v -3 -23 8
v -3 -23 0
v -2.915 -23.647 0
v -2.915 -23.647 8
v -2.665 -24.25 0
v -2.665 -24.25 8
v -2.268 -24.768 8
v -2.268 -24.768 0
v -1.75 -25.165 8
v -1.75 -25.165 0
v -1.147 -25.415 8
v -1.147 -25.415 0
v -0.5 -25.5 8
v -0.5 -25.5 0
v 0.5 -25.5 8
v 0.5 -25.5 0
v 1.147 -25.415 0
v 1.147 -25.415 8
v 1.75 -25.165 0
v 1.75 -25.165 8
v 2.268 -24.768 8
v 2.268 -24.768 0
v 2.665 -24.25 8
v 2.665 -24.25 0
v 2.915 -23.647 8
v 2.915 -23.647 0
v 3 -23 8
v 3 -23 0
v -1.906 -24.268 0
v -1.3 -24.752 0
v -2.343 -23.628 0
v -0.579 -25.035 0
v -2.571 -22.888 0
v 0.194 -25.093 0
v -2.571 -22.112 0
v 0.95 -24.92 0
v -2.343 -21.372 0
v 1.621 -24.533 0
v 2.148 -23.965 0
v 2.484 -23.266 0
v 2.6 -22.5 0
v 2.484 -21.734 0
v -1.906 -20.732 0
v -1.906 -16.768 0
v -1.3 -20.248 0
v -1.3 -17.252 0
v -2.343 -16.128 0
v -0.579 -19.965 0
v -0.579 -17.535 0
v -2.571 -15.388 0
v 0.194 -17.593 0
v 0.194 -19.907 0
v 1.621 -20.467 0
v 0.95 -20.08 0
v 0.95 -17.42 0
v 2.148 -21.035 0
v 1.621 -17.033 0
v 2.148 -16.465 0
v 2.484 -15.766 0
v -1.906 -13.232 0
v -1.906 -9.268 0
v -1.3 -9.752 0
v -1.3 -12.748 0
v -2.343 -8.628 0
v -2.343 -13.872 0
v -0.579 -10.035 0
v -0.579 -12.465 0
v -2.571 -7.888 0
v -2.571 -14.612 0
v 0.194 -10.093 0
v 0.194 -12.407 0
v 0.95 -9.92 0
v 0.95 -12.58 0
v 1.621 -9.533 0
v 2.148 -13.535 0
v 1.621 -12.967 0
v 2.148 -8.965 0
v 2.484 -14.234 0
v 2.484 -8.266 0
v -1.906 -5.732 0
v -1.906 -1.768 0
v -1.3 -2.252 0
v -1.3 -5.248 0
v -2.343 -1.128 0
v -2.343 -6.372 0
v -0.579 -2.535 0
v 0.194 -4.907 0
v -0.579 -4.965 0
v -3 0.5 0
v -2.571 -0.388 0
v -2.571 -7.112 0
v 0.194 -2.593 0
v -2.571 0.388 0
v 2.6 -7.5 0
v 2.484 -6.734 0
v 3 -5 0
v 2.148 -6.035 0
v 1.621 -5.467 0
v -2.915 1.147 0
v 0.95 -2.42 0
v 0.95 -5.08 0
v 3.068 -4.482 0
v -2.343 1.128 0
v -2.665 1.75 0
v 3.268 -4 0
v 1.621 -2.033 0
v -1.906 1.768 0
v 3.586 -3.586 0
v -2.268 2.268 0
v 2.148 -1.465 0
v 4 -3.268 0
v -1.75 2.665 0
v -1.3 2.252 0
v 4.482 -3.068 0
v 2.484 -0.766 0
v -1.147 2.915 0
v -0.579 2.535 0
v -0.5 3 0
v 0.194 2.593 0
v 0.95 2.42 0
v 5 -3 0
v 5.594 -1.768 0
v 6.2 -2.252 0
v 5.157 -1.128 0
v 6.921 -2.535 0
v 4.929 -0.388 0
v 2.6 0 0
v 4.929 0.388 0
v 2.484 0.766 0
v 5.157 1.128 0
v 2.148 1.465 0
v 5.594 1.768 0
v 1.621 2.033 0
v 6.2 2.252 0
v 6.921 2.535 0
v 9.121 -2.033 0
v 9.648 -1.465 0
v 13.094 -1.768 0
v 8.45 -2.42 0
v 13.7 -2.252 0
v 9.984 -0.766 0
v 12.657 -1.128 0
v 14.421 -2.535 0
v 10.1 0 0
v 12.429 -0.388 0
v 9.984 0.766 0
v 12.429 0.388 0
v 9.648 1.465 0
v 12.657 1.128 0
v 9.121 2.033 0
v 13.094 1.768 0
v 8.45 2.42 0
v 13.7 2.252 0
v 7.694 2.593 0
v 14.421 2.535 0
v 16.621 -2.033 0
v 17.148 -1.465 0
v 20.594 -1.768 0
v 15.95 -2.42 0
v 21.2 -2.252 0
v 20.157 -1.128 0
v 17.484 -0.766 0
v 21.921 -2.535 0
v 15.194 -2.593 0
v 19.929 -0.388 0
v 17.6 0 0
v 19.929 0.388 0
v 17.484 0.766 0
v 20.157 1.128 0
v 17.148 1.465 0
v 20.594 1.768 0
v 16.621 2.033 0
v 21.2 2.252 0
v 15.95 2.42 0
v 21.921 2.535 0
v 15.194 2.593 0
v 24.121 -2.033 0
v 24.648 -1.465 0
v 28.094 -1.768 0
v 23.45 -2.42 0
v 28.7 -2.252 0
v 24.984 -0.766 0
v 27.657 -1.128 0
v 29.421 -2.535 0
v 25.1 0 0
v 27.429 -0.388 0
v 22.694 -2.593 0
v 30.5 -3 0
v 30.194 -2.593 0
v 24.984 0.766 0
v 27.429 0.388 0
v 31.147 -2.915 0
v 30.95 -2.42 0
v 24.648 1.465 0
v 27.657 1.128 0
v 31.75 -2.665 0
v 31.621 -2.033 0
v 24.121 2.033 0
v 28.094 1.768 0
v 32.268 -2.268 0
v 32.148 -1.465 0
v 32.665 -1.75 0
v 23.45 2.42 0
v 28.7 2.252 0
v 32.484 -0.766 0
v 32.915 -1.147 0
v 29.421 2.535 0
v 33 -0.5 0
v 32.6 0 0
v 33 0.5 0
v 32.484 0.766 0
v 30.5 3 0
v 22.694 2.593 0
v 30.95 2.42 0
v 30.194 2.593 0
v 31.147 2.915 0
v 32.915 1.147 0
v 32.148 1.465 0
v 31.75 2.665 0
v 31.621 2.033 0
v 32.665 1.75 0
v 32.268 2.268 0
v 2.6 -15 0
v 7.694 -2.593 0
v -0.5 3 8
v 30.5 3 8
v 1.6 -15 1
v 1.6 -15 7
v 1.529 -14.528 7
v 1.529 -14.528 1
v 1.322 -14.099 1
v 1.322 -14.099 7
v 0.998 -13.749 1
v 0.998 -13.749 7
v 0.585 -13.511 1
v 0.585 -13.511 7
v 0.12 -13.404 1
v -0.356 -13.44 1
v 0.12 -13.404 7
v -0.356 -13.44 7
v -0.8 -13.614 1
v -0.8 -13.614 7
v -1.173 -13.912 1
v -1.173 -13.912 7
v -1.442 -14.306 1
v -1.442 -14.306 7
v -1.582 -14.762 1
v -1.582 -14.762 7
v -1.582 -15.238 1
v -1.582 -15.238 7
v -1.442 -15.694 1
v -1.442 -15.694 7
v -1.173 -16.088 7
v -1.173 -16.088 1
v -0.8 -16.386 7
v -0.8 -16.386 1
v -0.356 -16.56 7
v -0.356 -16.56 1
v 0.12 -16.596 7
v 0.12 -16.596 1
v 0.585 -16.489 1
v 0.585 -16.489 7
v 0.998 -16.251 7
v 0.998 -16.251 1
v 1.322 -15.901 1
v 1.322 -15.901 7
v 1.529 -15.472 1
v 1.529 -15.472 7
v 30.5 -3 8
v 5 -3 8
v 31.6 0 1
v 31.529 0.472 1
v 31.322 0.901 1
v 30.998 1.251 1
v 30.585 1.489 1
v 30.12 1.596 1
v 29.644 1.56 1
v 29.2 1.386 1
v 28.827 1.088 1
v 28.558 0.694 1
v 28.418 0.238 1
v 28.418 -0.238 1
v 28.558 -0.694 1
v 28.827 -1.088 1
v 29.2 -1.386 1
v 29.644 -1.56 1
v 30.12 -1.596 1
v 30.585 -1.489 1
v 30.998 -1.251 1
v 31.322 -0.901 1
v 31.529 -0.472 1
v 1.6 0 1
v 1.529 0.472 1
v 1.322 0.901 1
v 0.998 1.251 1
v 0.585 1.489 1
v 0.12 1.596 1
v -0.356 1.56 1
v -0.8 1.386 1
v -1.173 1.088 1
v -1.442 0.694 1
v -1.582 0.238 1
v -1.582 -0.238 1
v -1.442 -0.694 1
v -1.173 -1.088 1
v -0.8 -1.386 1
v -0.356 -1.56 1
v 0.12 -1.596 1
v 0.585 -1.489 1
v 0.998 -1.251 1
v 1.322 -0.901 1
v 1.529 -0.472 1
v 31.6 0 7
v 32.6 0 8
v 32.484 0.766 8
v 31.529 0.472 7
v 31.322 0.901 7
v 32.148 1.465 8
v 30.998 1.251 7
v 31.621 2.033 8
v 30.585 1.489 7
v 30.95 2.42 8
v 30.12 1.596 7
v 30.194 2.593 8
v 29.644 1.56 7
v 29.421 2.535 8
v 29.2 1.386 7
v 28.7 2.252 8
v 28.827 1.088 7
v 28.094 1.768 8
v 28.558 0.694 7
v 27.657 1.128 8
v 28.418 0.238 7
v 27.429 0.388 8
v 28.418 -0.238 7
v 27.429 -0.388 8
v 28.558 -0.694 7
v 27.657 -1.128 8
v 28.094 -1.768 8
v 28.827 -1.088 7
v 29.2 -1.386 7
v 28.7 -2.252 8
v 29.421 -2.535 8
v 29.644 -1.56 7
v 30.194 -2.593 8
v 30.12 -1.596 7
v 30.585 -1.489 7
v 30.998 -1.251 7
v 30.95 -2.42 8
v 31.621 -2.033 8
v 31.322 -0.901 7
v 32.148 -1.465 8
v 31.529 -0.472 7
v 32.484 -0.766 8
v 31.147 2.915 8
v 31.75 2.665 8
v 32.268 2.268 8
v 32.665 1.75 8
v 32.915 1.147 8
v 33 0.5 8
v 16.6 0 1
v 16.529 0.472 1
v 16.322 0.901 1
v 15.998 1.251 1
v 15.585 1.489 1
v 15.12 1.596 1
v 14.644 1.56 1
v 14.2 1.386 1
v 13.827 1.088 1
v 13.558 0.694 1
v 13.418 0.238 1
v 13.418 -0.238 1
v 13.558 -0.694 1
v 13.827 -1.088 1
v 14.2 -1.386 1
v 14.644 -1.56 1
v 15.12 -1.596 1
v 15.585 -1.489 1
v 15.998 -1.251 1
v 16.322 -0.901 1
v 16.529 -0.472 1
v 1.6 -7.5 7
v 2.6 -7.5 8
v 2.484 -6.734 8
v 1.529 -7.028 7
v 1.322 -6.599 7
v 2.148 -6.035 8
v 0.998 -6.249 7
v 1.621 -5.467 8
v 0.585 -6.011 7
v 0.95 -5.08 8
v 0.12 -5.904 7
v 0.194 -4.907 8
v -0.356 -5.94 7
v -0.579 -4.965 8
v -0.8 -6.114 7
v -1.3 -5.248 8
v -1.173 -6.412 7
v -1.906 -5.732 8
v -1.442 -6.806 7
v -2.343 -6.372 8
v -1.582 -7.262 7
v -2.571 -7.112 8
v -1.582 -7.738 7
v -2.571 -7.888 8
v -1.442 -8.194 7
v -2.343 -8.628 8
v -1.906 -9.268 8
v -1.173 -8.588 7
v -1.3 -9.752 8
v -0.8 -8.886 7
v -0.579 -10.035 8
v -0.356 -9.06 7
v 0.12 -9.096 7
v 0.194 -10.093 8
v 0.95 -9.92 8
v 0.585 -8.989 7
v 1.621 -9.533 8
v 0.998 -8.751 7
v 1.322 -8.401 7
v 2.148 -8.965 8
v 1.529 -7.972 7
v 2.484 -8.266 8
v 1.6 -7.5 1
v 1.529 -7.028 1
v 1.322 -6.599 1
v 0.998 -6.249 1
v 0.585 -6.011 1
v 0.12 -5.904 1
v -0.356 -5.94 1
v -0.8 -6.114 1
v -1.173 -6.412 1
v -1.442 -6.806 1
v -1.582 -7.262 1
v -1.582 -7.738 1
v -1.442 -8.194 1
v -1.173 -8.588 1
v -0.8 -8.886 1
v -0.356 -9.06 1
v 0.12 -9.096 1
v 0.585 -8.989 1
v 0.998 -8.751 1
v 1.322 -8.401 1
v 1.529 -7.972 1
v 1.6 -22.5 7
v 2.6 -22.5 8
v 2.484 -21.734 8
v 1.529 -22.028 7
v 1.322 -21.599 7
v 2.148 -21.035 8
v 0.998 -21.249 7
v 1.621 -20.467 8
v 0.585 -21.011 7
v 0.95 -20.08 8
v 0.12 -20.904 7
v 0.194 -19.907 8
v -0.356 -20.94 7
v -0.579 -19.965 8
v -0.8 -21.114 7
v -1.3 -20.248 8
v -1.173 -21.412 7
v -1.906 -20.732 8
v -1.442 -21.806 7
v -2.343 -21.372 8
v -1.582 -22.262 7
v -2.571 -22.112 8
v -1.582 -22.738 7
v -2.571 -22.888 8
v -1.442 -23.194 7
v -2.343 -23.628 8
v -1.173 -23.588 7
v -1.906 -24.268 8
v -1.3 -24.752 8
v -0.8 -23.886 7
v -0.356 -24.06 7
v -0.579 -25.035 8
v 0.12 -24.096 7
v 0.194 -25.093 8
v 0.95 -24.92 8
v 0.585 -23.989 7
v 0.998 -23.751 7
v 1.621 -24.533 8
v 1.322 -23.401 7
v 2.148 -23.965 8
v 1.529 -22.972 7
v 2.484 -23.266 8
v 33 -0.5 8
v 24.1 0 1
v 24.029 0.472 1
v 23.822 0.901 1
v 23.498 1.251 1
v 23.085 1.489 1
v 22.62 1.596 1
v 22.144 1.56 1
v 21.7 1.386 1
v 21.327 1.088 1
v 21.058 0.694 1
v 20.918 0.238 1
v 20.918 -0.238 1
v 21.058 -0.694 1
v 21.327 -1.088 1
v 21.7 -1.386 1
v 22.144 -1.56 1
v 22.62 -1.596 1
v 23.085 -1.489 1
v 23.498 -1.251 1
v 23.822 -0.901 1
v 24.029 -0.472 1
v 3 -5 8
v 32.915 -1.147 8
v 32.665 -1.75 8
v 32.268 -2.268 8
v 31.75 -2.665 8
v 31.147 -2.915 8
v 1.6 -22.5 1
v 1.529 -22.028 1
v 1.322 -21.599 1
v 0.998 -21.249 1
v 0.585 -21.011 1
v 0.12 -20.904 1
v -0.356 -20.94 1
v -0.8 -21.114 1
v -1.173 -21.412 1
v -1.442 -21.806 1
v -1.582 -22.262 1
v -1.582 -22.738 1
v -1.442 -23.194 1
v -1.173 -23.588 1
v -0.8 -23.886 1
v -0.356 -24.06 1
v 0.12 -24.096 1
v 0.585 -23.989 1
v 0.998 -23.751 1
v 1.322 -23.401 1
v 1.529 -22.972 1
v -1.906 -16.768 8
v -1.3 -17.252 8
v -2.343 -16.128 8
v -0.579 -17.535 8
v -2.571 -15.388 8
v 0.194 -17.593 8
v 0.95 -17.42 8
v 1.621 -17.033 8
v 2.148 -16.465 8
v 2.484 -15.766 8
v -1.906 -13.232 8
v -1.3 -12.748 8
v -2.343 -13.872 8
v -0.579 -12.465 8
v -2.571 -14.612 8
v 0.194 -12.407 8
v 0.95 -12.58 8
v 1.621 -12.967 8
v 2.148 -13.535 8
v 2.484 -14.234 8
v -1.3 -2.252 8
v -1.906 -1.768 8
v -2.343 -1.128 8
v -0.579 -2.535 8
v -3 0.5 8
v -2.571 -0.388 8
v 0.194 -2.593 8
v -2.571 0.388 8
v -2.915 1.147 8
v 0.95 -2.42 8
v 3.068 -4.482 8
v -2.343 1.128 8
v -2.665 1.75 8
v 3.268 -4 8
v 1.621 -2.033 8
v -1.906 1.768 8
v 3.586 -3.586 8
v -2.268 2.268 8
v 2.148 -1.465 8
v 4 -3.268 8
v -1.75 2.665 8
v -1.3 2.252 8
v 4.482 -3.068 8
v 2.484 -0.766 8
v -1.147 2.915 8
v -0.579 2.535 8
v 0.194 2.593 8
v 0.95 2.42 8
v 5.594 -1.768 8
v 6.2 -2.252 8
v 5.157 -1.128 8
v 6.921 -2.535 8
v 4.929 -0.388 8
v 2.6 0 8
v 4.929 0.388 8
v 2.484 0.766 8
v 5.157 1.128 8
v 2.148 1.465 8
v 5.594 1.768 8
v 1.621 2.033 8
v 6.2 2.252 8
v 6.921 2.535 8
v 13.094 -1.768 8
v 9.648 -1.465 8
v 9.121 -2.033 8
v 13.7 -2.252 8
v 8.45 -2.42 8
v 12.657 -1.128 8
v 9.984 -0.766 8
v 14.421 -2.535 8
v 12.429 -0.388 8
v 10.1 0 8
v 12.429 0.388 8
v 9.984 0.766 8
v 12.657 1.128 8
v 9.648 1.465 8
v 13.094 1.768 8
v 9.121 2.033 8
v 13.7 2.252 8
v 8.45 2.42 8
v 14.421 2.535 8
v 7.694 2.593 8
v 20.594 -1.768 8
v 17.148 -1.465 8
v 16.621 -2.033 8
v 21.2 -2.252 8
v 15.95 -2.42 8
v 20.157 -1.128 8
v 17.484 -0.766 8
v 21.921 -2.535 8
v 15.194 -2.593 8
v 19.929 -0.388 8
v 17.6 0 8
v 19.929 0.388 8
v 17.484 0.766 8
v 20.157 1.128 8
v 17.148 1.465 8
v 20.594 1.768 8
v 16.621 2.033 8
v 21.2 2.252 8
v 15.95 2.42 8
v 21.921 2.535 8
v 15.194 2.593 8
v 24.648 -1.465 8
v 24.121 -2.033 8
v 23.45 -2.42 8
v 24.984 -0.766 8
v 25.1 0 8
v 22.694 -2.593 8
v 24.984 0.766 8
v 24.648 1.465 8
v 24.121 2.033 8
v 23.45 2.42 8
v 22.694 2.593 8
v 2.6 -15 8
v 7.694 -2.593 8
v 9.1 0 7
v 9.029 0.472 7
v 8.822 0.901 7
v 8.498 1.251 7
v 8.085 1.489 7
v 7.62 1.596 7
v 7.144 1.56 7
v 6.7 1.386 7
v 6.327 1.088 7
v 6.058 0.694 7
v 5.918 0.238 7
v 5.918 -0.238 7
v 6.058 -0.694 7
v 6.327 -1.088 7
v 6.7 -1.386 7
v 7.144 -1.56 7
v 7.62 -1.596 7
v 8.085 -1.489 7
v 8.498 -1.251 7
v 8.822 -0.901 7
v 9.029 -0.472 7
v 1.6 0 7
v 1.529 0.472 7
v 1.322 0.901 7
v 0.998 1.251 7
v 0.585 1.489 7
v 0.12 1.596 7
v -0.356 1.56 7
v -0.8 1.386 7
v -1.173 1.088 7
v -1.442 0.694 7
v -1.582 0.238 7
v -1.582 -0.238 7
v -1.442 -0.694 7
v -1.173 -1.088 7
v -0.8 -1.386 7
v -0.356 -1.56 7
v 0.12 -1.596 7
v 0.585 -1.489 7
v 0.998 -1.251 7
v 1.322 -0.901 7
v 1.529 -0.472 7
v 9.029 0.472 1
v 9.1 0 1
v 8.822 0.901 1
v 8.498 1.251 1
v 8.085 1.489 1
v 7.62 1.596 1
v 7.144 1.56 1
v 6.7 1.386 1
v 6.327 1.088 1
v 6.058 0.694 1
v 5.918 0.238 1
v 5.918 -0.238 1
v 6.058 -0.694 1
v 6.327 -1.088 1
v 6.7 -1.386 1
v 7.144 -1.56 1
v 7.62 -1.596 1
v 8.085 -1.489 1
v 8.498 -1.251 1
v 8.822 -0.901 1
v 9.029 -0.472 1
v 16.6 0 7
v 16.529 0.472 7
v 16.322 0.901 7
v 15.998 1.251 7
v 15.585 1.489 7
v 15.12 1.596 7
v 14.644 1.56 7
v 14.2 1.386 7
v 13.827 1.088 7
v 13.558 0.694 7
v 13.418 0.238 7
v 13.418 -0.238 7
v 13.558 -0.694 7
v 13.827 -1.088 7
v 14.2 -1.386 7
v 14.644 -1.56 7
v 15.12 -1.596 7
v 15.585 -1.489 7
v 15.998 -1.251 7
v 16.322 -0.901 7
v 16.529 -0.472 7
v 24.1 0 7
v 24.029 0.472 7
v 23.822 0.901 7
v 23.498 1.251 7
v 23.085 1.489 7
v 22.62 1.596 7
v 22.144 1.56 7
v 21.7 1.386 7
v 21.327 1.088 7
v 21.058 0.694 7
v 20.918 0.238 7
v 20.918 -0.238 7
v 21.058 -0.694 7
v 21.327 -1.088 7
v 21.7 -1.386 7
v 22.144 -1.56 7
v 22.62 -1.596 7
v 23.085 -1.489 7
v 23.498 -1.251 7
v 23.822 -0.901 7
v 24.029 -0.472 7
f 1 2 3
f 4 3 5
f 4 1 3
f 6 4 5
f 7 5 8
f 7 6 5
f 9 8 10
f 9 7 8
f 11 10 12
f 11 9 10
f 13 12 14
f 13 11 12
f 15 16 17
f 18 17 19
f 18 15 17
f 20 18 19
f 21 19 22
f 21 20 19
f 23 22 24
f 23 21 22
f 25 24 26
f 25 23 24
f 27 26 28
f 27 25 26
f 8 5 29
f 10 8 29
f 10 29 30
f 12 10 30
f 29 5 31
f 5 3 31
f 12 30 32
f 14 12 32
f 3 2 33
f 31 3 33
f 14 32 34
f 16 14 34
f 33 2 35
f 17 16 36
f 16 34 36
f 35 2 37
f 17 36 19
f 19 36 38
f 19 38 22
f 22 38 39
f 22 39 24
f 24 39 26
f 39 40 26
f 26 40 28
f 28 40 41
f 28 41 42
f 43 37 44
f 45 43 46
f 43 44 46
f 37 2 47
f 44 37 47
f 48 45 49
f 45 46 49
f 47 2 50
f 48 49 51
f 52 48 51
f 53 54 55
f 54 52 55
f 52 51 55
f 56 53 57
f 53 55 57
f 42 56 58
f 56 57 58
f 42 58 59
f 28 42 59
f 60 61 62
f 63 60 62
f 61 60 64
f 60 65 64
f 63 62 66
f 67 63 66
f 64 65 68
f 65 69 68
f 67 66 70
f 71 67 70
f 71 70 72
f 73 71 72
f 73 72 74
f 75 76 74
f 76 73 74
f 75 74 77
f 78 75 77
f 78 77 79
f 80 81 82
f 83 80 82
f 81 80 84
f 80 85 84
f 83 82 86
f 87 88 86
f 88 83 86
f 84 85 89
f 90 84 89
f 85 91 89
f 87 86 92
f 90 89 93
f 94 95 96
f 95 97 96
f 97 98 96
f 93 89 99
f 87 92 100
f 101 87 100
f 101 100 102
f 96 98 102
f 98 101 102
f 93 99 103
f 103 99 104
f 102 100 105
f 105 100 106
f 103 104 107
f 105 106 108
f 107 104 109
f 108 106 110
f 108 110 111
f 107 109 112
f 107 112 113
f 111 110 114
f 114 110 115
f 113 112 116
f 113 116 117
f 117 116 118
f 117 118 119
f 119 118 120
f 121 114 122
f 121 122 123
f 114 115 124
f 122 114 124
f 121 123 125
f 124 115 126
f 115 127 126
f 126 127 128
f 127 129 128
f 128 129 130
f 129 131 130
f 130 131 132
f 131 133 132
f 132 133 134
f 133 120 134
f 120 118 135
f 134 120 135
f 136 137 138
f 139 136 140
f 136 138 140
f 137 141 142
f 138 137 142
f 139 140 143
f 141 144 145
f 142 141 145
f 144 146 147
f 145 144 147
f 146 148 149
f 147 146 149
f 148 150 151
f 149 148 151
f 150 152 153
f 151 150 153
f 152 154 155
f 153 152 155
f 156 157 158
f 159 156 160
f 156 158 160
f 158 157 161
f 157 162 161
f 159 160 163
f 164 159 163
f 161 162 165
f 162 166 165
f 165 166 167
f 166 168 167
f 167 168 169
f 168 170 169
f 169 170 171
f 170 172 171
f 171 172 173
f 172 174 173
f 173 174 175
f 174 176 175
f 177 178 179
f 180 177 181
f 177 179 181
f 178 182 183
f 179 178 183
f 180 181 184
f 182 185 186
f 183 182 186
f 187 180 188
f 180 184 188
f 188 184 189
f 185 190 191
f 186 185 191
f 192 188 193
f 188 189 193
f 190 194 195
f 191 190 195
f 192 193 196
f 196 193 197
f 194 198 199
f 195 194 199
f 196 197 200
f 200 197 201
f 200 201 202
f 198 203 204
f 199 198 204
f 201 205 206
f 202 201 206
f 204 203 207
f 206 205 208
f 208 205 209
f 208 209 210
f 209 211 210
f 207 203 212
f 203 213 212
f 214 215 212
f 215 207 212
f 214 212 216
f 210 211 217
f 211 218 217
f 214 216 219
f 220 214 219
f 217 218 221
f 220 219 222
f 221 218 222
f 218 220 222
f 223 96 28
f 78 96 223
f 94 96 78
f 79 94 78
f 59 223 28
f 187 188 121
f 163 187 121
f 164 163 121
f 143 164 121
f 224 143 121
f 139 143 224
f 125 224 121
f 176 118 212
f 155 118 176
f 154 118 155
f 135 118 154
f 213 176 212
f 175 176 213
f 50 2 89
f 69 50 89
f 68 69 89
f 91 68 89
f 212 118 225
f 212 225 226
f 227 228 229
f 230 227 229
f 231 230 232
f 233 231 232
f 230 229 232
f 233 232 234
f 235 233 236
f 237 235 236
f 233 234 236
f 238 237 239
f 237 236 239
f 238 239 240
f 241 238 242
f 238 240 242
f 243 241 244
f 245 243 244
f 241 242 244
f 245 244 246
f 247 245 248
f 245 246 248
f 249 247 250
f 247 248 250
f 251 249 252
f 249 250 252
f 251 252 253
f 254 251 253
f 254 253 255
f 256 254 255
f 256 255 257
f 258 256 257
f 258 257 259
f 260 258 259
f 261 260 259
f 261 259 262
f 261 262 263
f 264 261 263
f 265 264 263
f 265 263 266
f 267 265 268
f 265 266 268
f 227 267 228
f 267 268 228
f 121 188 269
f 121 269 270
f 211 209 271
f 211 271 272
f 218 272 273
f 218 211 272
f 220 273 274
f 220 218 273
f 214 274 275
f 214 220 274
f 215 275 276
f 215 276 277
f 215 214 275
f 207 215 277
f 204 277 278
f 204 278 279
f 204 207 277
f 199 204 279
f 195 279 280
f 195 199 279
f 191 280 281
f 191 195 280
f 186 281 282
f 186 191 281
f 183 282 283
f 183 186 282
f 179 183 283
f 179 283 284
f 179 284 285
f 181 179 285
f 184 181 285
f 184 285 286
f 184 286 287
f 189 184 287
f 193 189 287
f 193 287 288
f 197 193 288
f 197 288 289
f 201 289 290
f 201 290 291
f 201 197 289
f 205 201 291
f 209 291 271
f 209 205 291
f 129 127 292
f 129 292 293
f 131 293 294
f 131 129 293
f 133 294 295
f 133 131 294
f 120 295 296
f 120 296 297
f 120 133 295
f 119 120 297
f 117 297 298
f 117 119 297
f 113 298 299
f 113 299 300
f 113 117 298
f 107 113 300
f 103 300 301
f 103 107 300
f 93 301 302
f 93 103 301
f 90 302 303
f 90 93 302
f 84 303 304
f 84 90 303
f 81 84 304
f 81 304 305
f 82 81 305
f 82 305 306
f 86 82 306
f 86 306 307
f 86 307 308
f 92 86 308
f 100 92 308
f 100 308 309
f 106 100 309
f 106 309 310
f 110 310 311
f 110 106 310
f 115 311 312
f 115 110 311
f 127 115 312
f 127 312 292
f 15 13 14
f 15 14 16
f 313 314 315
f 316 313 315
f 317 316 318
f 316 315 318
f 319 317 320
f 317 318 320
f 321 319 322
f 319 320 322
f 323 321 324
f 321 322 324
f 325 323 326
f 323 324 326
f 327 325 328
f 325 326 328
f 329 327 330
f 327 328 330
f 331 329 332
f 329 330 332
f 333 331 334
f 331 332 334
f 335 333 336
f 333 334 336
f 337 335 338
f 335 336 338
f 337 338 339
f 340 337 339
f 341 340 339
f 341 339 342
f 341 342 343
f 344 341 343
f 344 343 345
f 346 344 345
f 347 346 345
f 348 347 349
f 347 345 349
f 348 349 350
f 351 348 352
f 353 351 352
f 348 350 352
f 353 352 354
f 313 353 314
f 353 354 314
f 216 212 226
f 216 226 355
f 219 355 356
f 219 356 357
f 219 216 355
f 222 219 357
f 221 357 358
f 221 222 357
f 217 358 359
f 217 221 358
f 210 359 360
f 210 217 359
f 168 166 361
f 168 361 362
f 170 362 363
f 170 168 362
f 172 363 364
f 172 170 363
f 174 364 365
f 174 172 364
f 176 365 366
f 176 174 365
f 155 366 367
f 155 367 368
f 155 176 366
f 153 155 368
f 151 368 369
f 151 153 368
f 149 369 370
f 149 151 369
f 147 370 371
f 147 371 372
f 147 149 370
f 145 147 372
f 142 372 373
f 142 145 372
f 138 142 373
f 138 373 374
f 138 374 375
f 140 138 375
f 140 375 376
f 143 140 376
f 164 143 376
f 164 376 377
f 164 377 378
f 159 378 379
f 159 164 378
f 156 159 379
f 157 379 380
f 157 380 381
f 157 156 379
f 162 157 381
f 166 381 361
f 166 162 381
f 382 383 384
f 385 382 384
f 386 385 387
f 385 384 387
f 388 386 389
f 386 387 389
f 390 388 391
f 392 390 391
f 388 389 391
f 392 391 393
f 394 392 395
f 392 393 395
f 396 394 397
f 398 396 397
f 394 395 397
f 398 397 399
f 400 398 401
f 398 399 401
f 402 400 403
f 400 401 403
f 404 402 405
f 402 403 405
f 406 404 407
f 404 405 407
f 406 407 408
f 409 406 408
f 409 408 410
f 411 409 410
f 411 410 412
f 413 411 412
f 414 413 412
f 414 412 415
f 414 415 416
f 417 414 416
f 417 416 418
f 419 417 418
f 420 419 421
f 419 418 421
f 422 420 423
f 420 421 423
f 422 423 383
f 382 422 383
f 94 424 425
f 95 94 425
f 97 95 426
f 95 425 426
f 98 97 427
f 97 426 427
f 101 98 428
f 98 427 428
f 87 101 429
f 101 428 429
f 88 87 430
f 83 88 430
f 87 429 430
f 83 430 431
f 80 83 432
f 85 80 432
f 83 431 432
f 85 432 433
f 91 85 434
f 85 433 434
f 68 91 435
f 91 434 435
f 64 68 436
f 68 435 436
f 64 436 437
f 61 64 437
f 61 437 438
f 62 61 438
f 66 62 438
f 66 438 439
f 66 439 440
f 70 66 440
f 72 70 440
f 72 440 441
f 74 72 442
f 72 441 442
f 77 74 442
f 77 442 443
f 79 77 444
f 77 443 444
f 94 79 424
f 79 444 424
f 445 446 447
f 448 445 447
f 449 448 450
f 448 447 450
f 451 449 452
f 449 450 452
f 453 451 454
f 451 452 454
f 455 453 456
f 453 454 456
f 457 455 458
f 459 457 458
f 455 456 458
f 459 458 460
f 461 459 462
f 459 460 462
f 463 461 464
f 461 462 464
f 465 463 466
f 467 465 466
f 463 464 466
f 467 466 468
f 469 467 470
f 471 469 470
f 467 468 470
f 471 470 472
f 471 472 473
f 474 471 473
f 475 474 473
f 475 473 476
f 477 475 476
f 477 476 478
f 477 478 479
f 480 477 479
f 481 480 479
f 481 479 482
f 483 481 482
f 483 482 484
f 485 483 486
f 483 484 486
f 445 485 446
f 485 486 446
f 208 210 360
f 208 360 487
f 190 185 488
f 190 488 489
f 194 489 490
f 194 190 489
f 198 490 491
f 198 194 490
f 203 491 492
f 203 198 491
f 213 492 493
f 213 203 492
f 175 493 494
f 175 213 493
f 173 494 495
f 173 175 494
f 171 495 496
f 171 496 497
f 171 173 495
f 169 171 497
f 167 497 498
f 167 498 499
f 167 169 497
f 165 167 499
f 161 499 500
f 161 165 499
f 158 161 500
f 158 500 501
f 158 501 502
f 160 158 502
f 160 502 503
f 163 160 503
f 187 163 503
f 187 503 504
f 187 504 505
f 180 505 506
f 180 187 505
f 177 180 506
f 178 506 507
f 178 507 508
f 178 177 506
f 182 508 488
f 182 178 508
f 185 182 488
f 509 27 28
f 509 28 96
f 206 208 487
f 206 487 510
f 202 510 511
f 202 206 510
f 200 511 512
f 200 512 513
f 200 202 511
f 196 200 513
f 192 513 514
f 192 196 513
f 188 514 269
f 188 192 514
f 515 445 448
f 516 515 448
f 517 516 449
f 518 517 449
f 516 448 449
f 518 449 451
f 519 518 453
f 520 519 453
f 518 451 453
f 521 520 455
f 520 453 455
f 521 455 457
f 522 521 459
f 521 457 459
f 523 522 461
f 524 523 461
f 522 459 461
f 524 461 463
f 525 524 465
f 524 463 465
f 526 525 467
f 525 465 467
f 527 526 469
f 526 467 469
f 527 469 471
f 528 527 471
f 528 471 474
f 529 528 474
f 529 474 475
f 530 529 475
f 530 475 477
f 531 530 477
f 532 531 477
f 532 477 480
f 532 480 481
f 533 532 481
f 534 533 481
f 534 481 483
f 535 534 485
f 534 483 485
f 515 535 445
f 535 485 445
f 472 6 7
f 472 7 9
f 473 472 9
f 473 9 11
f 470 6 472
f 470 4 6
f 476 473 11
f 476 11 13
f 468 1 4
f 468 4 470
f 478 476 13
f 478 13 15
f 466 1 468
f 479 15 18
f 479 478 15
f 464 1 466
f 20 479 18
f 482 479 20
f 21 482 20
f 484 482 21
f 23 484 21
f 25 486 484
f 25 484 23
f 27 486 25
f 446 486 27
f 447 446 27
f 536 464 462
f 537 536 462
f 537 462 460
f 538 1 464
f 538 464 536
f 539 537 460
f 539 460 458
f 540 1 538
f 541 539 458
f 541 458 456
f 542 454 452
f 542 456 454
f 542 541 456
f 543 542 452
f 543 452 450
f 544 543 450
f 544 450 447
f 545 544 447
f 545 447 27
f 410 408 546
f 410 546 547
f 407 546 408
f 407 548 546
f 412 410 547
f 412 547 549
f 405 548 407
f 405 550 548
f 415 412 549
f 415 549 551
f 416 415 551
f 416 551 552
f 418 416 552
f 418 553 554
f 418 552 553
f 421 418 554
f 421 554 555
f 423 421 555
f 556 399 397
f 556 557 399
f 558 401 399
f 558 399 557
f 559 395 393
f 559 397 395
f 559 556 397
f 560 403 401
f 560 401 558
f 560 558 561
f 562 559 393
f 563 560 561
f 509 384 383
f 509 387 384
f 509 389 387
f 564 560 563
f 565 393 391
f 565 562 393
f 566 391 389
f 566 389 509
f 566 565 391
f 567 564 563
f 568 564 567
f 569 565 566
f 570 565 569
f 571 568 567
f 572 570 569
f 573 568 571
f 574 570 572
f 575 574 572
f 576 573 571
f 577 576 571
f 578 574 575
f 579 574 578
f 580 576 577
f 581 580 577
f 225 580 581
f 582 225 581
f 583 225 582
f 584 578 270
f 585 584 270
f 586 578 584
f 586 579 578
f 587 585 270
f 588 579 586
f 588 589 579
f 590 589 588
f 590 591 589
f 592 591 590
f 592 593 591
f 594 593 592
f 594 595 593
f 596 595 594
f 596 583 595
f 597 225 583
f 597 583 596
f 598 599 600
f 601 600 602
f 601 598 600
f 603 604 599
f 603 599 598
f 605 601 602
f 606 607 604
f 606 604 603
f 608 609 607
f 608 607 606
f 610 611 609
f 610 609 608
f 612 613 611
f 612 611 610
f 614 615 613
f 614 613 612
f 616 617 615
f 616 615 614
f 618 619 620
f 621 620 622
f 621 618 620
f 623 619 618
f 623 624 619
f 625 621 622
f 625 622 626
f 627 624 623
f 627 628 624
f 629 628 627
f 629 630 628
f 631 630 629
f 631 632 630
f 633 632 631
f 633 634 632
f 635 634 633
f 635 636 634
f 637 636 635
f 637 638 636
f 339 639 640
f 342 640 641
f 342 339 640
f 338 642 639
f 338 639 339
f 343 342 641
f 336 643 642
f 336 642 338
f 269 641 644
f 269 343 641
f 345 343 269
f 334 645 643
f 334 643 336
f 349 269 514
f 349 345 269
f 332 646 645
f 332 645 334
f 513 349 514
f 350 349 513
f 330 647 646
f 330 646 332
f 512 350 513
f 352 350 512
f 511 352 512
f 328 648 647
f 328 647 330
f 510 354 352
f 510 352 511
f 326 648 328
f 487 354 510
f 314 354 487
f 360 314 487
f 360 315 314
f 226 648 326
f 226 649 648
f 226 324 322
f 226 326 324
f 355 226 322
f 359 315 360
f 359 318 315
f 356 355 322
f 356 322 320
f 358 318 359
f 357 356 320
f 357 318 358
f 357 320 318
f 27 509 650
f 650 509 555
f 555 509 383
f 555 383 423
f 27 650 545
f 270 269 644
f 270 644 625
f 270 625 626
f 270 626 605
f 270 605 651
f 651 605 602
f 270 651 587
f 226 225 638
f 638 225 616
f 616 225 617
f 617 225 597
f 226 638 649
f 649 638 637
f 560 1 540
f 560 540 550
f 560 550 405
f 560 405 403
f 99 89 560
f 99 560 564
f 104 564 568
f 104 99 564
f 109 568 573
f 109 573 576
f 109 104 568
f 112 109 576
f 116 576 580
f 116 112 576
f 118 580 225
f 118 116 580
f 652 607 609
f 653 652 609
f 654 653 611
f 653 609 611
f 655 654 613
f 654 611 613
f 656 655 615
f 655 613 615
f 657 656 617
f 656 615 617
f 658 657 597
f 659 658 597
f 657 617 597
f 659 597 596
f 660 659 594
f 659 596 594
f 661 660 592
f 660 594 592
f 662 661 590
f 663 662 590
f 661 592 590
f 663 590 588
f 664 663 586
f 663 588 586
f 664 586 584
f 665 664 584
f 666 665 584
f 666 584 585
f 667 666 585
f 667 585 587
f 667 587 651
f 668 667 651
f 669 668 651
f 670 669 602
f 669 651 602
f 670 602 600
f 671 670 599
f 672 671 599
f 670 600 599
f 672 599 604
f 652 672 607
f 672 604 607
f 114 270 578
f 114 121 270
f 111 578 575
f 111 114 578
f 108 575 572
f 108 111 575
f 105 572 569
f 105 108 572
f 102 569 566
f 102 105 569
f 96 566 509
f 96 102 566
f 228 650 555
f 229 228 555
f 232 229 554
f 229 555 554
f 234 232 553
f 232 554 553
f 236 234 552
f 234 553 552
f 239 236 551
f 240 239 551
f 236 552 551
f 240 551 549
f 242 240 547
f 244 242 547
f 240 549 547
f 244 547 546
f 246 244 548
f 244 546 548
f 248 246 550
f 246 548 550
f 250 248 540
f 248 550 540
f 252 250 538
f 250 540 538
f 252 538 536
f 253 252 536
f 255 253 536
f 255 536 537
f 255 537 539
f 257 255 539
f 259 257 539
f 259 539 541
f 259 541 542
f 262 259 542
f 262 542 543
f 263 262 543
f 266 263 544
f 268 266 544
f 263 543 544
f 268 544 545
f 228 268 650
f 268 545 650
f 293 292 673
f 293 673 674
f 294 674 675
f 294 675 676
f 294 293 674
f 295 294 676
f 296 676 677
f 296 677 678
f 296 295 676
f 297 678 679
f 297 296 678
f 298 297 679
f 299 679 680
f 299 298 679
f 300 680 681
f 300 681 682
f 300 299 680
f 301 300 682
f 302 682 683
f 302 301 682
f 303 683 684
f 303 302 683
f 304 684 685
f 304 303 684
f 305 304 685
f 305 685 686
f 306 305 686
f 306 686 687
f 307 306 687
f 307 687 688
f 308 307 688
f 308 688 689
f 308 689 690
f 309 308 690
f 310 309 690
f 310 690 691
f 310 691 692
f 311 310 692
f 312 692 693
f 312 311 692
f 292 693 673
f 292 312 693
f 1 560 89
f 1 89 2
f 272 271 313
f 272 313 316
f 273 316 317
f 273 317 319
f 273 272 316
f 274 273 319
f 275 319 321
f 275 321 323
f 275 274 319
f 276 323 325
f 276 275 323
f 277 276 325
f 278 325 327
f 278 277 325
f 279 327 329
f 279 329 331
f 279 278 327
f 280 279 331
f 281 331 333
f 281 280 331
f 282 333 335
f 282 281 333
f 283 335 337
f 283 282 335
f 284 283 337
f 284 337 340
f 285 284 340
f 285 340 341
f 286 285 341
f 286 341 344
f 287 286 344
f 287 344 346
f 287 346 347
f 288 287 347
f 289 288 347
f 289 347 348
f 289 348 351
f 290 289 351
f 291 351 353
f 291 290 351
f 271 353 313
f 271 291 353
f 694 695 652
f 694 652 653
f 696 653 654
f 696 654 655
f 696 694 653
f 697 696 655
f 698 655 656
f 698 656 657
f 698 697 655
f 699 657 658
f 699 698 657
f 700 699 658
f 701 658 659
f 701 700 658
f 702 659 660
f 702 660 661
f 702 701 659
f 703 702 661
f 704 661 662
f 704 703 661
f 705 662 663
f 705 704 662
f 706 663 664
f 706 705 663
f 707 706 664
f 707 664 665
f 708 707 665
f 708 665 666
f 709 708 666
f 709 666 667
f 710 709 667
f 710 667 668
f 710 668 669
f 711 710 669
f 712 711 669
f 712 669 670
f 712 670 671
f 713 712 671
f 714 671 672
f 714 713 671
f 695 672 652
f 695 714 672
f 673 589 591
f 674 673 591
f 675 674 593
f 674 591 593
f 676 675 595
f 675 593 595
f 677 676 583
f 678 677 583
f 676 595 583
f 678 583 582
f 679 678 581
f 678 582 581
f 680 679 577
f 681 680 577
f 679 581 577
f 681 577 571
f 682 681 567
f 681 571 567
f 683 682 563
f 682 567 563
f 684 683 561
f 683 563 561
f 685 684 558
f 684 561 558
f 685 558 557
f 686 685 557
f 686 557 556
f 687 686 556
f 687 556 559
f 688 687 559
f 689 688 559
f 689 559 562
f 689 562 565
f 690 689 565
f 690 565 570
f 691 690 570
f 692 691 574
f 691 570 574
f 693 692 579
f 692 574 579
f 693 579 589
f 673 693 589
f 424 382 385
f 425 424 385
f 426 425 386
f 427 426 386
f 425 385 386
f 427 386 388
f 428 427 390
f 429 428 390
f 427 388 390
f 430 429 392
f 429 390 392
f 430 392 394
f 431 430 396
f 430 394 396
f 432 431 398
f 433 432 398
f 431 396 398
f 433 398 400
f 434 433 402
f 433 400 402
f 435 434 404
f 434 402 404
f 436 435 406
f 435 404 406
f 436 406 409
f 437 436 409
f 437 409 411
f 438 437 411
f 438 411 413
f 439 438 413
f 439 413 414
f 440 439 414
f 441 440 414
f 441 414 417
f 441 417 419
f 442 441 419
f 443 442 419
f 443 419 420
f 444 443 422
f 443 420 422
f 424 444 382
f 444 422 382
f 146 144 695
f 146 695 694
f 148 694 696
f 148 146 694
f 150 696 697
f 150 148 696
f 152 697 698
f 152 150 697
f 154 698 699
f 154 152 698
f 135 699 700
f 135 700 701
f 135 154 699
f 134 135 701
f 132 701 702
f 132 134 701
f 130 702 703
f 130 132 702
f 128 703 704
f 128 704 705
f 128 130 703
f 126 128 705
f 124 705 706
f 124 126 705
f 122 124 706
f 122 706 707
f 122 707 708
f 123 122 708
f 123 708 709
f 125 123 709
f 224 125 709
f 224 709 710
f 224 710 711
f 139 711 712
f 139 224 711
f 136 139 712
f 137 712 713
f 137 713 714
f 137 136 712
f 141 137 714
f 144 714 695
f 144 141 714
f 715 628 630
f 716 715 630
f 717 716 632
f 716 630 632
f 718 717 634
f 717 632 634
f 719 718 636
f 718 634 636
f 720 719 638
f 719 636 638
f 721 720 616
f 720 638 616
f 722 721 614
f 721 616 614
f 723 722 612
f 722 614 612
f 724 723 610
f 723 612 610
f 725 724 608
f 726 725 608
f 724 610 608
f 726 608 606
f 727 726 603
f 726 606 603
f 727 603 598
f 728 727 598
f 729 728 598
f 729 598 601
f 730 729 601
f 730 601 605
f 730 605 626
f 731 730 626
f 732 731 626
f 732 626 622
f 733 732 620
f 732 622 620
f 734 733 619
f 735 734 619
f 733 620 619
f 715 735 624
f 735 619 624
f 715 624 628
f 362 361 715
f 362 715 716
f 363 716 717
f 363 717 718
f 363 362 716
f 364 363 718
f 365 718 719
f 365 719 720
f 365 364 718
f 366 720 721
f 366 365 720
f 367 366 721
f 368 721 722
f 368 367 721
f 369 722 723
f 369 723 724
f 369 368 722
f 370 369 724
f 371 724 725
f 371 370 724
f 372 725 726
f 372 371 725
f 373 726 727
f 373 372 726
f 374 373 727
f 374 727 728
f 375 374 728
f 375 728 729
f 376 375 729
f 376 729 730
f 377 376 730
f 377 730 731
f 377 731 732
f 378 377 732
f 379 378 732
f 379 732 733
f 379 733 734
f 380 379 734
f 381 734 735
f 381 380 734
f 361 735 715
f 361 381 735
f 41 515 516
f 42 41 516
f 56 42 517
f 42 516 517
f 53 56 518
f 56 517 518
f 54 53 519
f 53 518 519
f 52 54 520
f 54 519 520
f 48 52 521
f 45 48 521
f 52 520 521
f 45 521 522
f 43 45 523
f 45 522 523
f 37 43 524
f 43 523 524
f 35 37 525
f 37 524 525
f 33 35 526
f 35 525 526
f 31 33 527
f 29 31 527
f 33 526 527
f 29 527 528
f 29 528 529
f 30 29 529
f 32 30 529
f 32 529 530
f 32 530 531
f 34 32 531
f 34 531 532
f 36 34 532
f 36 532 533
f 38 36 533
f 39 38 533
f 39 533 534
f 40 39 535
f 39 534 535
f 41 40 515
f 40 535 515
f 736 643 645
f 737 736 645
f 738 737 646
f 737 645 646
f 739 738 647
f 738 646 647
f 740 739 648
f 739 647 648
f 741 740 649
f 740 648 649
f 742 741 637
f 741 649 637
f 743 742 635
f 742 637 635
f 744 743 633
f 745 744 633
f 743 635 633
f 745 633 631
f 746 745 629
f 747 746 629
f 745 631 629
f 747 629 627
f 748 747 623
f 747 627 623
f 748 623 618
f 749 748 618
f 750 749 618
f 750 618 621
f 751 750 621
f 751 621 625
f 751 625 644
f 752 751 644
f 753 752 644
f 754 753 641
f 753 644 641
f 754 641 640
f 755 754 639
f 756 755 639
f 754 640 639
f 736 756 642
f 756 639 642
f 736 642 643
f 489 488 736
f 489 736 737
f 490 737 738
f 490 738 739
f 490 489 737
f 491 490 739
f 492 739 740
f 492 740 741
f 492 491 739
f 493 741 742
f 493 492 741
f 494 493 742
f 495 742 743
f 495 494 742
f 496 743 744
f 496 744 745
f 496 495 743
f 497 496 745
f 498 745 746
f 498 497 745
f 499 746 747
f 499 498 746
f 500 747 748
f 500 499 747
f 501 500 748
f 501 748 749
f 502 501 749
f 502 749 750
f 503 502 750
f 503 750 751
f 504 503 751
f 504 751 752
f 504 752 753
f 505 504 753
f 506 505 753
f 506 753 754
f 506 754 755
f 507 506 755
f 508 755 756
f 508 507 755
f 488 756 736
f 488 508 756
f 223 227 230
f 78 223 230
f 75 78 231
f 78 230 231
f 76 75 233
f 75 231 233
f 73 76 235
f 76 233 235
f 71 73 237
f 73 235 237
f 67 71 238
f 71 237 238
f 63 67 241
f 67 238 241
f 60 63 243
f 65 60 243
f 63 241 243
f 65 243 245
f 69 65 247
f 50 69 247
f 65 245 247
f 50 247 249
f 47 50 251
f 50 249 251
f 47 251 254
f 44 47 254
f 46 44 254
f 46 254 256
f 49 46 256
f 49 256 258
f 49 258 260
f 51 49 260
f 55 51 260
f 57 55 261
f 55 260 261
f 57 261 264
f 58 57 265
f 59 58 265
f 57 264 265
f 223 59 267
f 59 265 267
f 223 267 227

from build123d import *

# Parameters (mm, degrees)
SKETCH1_R           = 1.6
BOSS_EXTRUDE1_DEPTH = 8
CHAMFER1_SIZE       = 1
SKETCH2_R           = 1.6
BOSS_EXTRUDE3_DEPTH = 8
FILLET1_R           = 2
CHAMFER5_SIZE       = 1


with BuildPart() as part:
    # Sketch1 → Boss-Extrude1 (new body)
    with BuildSketch(Plane.XY):
        with BuildLine():
            Line((-0.5, 3), (30.5, 3))
            ThreePointArc((30.5, 3), (32.267766953, 2.267766953), (33, 0.5))
            Line((33, 0.5), (33, -0.5))
            ThreePointArc((33, -0.5), (32.267766953, -2.267766953), (30.5, -3))
            Line((30.5, -3), (-0.5, -3))
            ThreePointArc((-0.5, -3), (-2.267766953, -2.267766953), (-3, -0.5))
            Line((-3, -0.5), (-3, 0.5))
            ThreePointArc((-3, 0.5), (-2.267766953, 2.267766953), (-0.5, 3))
        make_face()
        Circle(SKETCH1_R, mode=Mode.SUBTRACT)
        with Locations((7.5, 0)):
            Circle(SKETCH1_R, mode=Mode.SUBTRACT)
        with Locations((15, 0)):
            Circle(SKETCH1_R, mode=Mode.SUBTRACT)
        with Locations((22.5, 0)):
            Circle(SKETCH1_R, mode=Mode.SUBTRACT)
        with Locations((30, 0)):
            Circle(SKETCH1_R, mode=Mode.SUBTRACT)
    extrude(amount=BOSS_EXTRUDE1_DEPTH)

    # Chamfer1
    chamfer1_edges = [part.edges().sort_by_distance(p)[0] for p in [
        (-1.6, 0, 0),
        (-1.6, 0, 8),
        (5.9, 0, 0),
        (5.9, 0, 8),
        (13.4, 0, 0),
        (13.4, 0, 8),
        (20.9, 0, 0),
        (20.9, 0, 8),
        (28.4, 0, 0),
        (28.4, 0, 8),
    ]]
    chamfer(chamfer1_edges, length=CHAMFER1_SIZE)

    # Sketch2 → Boss-Extrude3 (add)
    with BuildSketch(Plane.XY.offset(8)):
        with BuildLine():
            ThreePointArc((-0.5, -3), (-2.267766953, -2.267766953), (-3, -0.5))
            Line((-3, -0.5), (-3, -23))
            ThreePointArc((-3, -23), (-2.267766953, -24.767766953), (-0.5, -25.5))
            Line((-0.5, -25.5), (0.5, -25.5))
            ThreePointArc((0.5, -25.5), (2.267766953, -24.767766953), (3, -23))
            Line((3, -23), (3, -3))
            Line((3, -3), (-0.5, -3))
        make_face()
        with Locations((0, -22.5)):
            Circle(SKETCH2_R, mode=Mode.SUBTRACT)
        with Locations((0, -15)):
            Circle(SKETCH2_R, mode=Mode.SUBTRACT)
        with Locations((0, -7.5)):
            Circle(SKETCH2_R, mode=Mode.SUBTRACT)
    extrude(amount=-BOSS_EXTRUDE3_DEPTH)

    # Fillet1
    fillet1_edges = [part.edges().sort_by_distance(p)[0] for p in [
        (3, -3, 4),
    ]]
    fillet(fillet1_edges, radius=FILLET1_R)

    # Chamfer5
    chamfer5_edges = [part.edges().sort_by_distance(p)[0] for p in [
        (-1.6, -7.5, 8),
        (-1.6, -15, 8),
        (-1.6, -22.5, 8),
        (-1.6, -22.5, 0),
        (-1.6, -15, 0),
        (-1.6, -7.5, 0),
    ]]
    chamfer(chamfer5_edges, length=CHAMFER5_SIZE)


solid = part.part
